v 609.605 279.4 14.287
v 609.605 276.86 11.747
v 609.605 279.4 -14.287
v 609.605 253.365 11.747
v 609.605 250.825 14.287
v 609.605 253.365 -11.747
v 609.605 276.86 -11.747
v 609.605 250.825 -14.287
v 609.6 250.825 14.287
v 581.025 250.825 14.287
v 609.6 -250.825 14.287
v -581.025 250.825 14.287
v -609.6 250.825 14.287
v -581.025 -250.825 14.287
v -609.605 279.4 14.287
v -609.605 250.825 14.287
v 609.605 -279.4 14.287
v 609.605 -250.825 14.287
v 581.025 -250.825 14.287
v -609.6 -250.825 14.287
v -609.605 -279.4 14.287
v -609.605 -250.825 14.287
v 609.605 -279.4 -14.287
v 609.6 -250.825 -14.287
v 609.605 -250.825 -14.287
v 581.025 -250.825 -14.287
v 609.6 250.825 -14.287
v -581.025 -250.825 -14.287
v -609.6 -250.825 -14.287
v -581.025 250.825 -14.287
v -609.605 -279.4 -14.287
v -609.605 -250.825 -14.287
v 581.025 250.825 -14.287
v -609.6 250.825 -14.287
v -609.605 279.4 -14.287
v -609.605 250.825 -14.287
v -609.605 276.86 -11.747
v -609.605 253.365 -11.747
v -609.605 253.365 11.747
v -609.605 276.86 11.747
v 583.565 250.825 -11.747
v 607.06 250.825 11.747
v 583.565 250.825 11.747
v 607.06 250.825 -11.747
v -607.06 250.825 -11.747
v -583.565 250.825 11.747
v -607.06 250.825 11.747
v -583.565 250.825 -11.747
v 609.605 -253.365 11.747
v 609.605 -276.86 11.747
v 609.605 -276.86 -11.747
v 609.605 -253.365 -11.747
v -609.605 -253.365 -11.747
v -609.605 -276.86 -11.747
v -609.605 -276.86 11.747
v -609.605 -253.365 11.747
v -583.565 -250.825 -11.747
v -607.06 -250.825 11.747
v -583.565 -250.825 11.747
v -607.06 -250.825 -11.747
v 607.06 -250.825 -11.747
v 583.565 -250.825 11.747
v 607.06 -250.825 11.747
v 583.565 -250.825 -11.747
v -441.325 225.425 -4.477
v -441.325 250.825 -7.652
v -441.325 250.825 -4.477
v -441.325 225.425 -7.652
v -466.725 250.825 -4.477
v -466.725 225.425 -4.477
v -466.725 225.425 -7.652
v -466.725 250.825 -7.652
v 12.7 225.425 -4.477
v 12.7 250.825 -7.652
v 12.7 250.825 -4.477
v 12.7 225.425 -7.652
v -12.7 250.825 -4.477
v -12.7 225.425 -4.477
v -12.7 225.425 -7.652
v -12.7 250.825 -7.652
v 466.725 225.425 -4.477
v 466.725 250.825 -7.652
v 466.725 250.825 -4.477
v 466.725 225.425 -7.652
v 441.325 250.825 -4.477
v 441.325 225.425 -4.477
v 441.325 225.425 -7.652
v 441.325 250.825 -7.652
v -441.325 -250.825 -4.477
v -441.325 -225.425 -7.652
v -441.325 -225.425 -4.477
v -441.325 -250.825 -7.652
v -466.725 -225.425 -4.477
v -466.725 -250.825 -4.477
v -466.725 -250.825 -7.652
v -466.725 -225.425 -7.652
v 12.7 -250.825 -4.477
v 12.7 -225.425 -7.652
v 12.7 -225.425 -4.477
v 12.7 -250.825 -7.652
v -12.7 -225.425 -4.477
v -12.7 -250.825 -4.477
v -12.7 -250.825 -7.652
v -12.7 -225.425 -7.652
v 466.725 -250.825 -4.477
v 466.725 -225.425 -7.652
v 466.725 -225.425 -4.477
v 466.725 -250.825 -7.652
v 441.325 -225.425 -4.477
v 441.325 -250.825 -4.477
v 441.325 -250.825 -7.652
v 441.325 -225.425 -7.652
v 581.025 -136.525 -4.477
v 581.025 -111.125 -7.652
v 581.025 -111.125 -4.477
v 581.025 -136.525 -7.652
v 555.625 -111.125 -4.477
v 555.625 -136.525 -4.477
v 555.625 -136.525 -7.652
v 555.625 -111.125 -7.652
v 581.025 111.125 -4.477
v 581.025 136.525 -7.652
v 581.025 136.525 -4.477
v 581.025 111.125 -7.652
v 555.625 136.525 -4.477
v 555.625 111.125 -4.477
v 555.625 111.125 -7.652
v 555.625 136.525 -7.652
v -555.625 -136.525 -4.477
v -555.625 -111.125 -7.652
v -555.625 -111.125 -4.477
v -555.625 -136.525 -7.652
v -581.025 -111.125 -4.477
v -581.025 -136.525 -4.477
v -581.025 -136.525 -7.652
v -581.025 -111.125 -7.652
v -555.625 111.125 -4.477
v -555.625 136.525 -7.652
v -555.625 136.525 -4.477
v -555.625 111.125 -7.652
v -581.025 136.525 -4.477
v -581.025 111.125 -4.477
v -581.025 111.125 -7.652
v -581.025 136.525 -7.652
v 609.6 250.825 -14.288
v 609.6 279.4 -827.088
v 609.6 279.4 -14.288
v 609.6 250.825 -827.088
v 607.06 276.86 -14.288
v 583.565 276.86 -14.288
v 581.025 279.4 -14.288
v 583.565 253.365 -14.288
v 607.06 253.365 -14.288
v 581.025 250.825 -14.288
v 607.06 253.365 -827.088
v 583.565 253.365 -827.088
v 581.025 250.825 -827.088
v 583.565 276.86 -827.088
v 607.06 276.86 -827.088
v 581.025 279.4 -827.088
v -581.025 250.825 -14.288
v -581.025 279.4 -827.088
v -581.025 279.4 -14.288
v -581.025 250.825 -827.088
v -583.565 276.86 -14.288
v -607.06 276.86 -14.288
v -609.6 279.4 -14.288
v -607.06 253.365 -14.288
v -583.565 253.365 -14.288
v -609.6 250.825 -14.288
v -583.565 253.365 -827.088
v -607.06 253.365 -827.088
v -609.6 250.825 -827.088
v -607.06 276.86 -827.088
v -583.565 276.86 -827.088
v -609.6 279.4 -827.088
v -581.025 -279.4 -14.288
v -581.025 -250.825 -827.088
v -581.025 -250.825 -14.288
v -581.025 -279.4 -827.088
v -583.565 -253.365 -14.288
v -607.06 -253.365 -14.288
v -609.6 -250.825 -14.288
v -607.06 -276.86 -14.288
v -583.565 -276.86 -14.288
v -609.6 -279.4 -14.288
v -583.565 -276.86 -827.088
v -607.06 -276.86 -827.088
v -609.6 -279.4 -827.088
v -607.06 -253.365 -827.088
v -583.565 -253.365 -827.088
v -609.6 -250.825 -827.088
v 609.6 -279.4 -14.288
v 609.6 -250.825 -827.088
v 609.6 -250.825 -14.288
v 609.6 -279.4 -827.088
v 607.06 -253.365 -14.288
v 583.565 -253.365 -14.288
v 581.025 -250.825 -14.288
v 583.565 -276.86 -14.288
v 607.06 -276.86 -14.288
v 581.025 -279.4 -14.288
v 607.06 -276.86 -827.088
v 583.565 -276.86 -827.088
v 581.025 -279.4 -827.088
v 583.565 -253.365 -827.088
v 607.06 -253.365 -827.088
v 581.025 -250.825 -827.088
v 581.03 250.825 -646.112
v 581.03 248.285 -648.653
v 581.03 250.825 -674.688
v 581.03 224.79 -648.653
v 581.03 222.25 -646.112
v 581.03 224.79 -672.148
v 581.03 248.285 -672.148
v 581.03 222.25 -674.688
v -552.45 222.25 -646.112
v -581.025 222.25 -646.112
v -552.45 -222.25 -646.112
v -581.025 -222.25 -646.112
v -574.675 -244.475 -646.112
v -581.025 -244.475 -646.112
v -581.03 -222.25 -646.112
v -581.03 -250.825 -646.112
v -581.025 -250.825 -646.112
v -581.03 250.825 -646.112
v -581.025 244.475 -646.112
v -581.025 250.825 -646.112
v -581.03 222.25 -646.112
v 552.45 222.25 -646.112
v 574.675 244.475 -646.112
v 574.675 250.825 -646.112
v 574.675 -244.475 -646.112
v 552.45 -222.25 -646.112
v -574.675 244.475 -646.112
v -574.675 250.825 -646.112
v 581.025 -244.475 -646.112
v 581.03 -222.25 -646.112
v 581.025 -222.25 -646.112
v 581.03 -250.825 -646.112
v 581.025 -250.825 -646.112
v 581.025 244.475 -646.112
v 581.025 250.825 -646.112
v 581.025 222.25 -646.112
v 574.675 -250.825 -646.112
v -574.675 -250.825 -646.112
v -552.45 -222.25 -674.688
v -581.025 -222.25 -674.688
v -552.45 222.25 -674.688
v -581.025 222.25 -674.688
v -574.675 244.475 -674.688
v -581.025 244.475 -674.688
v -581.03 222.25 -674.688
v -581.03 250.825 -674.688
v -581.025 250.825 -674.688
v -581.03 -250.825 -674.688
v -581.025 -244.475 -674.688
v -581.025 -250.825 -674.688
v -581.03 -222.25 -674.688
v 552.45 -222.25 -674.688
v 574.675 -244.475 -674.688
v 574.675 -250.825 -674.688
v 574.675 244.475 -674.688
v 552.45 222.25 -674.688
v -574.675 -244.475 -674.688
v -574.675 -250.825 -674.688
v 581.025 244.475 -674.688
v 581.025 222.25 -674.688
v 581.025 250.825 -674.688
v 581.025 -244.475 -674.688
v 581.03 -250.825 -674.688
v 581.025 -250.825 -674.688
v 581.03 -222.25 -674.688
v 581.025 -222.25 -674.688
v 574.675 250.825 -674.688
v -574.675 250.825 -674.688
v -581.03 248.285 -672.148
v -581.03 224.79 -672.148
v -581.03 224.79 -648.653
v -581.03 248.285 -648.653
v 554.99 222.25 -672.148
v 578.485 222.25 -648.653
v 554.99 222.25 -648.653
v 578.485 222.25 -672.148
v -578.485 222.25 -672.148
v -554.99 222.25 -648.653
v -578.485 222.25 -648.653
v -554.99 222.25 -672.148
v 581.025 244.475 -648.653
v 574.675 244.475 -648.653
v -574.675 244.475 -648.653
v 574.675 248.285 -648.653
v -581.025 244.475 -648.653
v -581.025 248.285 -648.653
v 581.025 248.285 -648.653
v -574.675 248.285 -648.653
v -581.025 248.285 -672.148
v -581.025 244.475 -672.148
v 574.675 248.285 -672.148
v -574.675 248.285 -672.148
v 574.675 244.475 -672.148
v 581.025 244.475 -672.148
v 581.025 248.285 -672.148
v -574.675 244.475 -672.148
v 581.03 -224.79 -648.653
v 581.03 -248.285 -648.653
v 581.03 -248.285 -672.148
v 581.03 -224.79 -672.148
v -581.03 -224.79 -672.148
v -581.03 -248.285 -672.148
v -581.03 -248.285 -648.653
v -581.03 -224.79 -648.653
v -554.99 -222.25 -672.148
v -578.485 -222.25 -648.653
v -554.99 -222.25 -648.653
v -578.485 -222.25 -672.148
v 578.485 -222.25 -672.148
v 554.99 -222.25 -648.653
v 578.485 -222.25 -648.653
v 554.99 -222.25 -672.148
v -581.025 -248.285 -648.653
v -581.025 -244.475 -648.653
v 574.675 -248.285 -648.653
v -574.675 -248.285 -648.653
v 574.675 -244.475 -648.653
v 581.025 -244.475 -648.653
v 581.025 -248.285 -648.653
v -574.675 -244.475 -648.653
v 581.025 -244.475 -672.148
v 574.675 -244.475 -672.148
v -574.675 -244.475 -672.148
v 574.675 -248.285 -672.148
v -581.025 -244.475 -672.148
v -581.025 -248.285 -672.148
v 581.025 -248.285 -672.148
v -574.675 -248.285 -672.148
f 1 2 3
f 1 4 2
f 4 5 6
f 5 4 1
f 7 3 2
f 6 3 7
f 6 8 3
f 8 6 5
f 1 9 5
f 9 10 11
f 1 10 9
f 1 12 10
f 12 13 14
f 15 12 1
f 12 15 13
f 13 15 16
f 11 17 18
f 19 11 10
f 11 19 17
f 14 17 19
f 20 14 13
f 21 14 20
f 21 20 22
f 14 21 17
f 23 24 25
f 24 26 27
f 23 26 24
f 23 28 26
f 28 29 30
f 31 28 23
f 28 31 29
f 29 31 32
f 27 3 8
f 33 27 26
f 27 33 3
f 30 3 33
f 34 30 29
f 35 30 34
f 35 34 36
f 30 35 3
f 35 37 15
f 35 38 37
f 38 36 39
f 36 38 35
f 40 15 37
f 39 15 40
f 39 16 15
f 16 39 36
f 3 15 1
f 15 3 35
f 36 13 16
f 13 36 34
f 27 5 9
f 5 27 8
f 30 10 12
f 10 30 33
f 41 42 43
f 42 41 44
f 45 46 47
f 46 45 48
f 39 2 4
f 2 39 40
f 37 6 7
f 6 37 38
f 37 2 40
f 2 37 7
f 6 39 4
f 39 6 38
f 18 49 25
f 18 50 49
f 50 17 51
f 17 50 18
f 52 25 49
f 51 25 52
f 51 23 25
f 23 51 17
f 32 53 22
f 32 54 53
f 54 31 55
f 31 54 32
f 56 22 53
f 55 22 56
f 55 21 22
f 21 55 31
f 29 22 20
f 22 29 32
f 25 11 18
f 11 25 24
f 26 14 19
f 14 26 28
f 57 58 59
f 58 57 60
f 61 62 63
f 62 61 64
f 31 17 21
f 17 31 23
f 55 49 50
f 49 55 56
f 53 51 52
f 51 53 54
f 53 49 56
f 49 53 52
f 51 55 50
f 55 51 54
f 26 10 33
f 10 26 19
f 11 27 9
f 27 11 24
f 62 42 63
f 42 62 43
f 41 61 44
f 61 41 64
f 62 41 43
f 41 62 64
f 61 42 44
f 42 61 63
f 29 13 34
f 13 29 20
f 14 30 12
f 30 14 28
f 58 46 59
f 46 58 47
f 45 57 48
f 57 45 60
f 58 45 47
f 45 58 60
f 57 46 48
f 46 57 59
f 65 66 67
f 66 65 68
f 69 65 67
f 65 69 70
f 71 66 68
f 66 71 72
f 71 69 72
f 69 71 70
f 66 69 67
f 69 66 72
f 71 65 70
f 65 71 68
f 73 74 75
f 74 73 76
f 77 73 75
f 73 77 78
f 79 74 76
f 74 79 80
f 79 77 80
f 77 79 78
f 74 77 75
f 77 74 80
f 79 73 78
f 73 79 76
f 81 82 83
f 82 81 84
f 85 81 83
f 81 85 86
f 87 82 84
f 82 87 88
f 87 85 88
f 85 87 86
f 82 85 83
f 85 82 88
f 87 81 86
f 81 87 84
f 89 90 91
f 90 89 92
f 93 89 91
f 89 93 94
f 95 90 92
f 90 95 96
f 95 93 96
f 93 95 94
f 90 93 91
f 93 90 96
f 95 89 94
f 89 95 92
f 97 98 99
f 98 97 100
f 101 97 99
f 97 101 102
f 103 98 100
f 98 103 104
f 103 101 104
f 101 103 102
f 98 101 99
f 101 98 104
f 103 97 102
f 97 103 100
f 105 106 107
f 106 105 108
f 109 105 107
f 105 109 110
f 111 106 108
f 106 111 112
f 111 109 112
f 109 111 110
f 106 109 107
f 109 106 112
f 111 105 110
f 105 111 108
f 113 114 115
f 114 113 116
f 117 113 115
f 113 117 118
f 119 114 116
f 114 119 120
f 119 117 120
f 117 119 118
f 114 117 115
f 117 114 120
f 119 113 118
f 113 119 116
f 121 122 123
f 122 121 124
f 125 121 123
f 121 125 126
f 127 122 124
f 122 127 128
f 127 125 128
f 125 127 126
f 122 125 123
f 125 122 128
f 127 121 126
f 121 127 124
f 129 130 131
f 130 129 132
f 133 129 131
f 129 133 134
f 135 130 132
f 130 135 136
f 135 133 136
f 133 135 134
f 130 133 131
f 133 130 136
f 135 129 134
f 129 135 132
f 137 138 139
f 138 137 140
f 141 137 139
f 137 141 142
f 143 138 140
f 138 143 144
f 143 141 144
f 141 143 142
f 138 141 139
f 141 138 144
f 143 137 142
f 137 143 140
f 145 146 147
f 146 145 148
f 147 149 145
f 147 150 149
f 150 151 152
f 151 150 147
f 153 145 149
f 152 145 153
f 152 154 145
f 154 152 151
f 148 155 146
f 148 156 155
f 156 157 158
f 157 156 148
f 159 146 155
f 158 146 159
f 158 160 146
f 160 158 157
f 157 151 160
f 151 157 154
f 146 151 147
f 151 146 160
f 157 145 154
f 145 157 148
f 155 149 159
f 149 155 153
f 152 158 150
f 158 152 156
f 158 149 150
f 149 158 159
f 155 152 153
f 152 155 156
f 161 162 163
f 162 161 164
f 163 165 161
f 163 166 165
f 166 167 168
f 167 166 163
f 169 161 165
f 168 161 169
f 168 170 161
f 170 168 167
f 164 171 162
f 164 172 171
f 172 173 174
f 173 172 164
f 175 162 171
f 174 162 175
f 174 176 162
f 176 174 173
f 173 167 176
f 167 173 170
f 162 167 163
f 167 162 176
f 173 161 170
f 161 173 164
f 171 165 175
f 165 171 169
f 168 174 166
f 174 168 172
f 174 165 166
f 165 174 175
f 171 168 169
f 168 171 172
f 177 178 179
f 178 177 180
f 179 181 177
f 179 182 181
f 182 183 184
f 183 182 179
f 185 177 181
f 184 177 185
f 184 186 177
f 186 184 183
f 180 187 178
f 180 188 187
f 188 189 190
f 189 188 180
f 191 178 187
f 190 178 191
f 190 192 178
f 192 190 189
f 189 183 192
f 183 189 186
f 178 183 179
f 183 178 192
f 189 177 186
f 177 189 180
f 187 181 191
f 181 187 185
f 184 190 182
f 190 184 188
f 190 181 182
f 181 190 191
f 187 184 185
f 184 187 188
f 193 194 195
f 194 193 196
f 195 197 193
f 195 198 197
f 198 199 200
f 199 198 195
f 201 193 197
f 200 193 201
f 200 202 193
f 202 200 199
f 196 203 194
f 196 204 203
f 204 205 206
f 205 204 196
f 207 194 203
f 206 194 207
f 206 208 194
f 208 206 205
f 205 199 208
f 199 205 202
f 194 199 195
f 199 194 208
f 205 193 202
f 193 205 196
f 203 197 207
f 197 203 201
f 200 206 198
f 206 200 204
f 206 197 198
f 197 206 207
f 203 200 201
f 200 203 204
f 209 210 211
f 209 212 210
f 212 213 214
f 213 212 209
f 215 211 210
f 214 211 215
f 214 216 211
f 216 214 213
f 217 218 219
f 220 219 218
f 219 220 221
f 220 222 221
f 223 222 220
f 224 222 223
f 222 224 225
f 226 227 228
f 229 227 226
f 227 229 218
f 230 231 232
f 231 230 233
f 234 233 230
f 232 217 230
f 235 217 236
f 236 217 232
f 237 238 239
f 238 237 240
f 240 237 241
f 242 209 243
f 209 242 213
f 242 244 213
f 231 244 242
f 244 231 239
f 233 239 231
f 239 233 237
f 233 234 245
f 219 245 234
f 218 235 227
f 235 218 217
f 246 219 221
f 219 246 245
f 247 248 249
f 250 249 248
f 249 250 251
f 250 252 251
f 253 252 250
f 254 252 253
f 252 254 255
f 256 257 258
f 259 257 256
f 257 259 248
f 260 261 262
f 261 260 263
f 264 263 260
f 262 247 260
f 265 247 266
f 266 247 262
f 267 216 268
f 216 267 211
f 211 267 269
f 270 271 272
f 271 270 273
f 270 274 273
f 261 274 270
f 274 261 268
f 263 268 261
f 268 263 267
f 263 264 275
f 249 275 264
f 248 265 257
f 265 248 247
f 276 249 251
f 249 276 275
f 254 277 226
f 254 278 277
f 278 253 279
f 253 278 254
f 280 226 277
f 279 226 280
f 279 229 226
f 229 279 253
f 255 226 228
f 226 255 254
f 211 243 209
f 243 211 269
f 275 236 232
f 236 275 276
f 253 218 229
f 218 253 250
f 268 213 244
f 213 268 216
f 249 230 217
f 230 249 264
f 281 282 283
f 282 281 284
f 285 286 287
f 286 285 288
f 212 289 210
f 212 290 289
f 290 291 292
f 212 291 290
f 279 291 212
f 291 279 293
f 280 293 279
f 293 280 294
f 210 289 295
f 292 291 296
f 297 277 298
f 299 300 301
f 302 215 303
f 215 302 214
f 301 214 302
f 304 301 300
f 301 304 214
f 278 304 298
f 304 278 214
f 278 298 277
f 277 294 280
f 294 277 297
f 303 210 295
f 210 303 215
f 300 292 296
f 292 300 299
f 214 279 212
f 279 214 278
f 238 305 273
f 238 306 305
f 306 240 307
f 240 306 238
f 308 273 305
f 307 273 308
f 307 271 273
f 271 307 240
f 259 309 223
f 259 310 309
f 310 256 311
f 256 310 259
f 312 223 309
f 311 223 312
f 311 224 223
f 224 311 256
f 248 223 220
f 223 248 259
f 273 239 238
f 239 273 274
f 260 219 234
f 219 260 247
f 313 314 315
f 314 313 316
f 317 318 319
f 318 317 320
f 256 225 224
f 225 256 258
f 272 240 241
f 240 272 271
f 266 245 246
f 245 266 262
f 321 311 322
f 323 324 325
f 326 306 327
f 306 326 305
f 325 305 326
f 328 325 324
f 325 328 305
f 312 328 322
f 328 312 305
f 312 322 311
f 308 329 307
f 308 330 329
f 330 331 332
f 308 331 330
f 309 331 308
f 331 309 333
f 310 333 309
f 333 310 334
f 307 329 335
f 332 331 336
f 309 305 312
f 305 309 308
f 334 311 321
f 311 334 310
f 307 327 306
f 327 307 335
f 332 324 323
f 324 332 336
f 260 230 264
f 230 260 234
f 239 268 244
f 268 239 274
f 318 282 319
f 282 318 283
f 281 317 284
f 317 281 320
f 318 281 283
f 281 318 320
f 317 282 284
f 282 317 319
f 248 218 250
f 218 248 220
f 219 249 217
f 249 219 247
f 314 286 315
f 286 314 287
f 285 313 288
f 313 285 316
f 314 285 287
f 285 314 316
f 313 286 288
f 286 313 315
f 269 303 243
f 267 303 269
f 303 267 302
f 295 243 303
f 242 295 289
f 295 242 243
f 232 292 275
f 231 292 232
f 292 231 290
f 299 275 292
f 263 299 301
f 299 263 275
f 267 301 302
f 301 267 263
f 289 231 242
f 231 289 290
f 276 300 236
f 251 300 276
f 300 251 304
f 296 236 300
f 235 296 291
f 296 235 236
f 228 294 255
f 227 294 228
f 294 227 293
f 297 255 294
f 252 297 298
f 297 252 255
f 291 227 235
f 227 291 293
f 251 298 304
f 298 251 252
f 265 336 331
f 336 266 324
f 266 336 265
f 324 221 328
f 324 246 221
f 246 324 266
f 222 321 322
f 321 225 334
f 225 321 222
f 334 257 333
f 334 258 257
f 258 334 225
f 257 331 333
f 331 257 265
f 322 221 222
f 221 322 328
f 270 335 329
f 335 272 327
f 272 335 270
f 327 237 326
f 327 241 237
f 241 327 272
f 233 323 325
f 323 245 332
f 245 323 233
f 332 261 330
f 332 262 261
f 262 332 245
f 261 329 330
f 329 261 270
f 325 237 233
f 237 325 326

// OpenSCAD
//
// Rectangular/Square Welded Table Frame – Import‑friendly OpenSCAD
// - 1.125" square tube, wall param (0.100" default, set 0.125" for 1/8")
// - Top frame: butt joints
// - Tabs: 3 on long edges, 2 on short edges; 5" from each end; 1"x1"x(tab_thk)
// - Legs: 32" long
// - Stretcher ring: butt-jointed rectangle at height with 0.25"x0.25" corner notches
// - BOM echo with lengths and weight
// Author: M365 Copilot (for Kevin Gordon)
//

unit = 25.4;                      // mm per inch; set to 1 for inch-native display
function U(x) = x * unit;

eps = 0.01;                       // small overlap (mm) for boolean stability
$fa = 2; $fs = 0.5;

// ---------------- Parameters ----------------

// Size (outside dimensions)
outer_x_in = 48;                  // long direction (X) – set equal to Y for a square
outer_y_in = 22;                  // short direction (Y)

// Tube spec
tube_od_in = 1.125;               // square tube OD
wall_in    = 0.100;               // wall thickness (0.100 or 0.125)

// Frame fit
fit_gap_in = 0.00;                // relief on the short frame members (Y) if desired

// Legs
add_legs   = true;
leg_len_in = 32.0;

// Stretcher ring (replaces earlier 4‑rail perimeter)
add_stretcher_ring            = true;
stretcher_bottom_from_floor_in = 6.0;   // bottom of ring above floor
stretcher_notch_in            = 0.25;   // 0.25" x 0.25" corner notch

// Plywood & tabs (support ledges)
add_tabs          = true;
ply_thick_in      = 23/32;              // 0.71875 typical 3/4" plywood
ply_clear_in      = 0.02;               // vertical install clearance
recess_in         = 0.00;               // 0 = flush top; set 0.125 to recess 1/8"

tab_len_in        = 1.00;               // 1" along side
tab_depth_in      = 1.00;               // 1" inward
tab_thk_in        = 0.125;              // default 1/8" tabs (set 0.100 to match 0.100" wall)
tab_edge_margin_in = 5.00;              // centers 5" from each end

// Tab counts (as requested)
n_tabs_long_side  = 3;                  // long edges
n_tabs_short_side = 2;                  // short edges

// Tab holes (optional)
tabs_with_holes   = false;              // set true to add screw holes
hole_dia_in       = 0.188;              // ~3/16"
hole_inset_in     = 0.50;               // hole center inset from wall into tab

// BOM / weight echo (console output)
do_bom_echo             = true;
material_name           = "Steel";       // label only
material_density_lb_in3 = 0.283;         // Steel ~0.283, Aluminum ~0.0975

// ---------------- Derived (model units) ----------------

tube_od  = U(tube_od_in);
wall     = U(wall_in);
fit_gap  = U(fit_gap_in);

outer_x  = U(outer_x_in);
outer_y  = U(outer_y_in);
inner_x  = outer_x - 2 * tube_od;
inner_y  = outer_y - 2 * tube_od;

leg_len  = U(leg_len_in);

stretcher_bottom_from_floor = U(stretcher_bottom_from_floor_in);
stretcher_notch = U(stretcher_notch_in);

ply_thick = U(ply_thick_in);
ply_clear = U(ply_clear_in);
recess    = U(recess_in);

tab_len   = U(tab_len_in);
tab_depth = U(tab_depth_in);
tab_thk   = U(tab_thk_in);
tab_margin = U(tab_edge_margin_in);

hole_dia  = U(hole_dia_in);
hole_inset = U(hole_inset_in);

// ---------------- Geometry Modules ----------------

// Hollow square tube along X
module square_tube_x(L, od=tube_od, w=wall) {
    difference() {
        translate([-L/2, -od/2, -od/2]) cube([L, od, od], center=false);
        // hollow
        translate([-L/2 - eps, -(od/2 - w), -(od/2 - w)])
            cube([L + 2*eps, od - 2*w, od - 2*w], center=false);
    }
}

// Hollow square tube along Z; TOP at z=0; extends downward by L
module square_tube_z(L, od=tube_od, w=wall) {
    difference() {
        translate([-od/2, -od/2, -L]) cube([od, od, L], center=false);
        translate([-(od/2 - w), -(od/2 - w), -L - eps])
            cube([od - 2*w, od - 2*w, L + 2*eps], center=false);
    }
}

// Rectangular butt-jointed frame (two X rails full length, two Y rails between)
module frame_rect(ox=outer_x, oy=outer_y, od=tube_od, w=wall, gap=0) {
    // X rails (full outer_x) at ±Y
    translate([0,  (oy/2 - od/2), 0]) square_tube_x(ox + eps, od, w);
    translate([0, -(oy/2 - od/2), 0]) square_tube_x(ox + eps, od, w);

    // Y rails (length outer_y - 2*od - gap) at ±X
    Ly = oy - 2*od - gap;
    translate([ (ox/2 - od/2), 0, 0]) rotate([0,0,90]) square_tube_x(Ly + eps, od, w);
    translate([-(ox/2 - od/2), 0, 0]) rotate([0,0,90]) square_tube_x(Ly + eps, od, w);
}

// Four legs at outer corners; top of leg flush to frame bottom (z = -od/2)
module legs_four_rect(ox=outer_x, oy=outer_y, od=tube_od, L=leg_len) {
    cx = ox/2 - od/2;
    cy = oy/2 - od/2;
    translate([ +cx, +cy, -od/2 ]) square_tube_z(L, od);
    translate([ -cx, +cy, -od/2 ]) square_tube_z(L, od);
    translate([ -cx, -cy, -od/2 ]) square_tube_z(L, od);
    translate([ +cx, -cy, -od/2 ]) square_tube_z(L, od);
}

// Stretcher ring at height with 0.25"x0.25" corner notches
// Outer size = inner_x × inner_y, so ring OUTER faces align with legs' INNER faces.
module stretcher_ring_notched_rect(ix=inner_x, iy=inner_y, od=tube_od, w=wall,
                                   legL=leg_len, bottom_from_floor=stretcher_bottom_from_floor,
                                   notch=stretcher_notch) {
    // Vertical placement
    z_leg_bottom = -od/2 - legL;
    z_bottom     =  z_leg_bottom + bottom_from_floor;  // bottom of ring tubes
    z_center     =  z_bottom + od/2;                   // square_tube_x is centered in Z

    difference() {
        // Ring itself: butt-jointed frame with outer = (ix, iy)
        translate([0,0,z_center]) frame_rect(ix, iy, od, w, 0);

        // Corner notches (4 cubes). Remove a 0.25"x0.25" bite through tube depth.
        // NE (+X,+Y)
        translate([ +ix/2 - notch, +iy/2 - notch, z_center - od/2 - eps ])
            cube([ notch, notch, od + 2*eps ], center=false);
        // NW (−X,+Y)
        translate([ -ix/2,         +iy/2 - notch, z_center - od/2 - eps ])
            cube([ notch, notch, od + 2*eps ], center=false);
        // SW (−X,−Y)
        translate([ -ix/2,         -iy/2,         z_center - od/2 - eps ])
            cube([ notch, notch, od + 2*eps ], center=false);
        // SE (+X,−Y)
        translate([ +ix/2 - notch, -iy/2,         z_center - od/2 - eps ])
            cube([ notch, notch, od + 2*eps ], center=false);
    }
}

// Tabs: 3 on the long edges, 2 on the short edges; centers at 5" from each end.
// Long axis determined by comparing outer_x vs outer_y.
module tabs_rect_all_sides(ix=inner_x, iy=inner_y, od=tube_od) {
    if (add_tabs) {
        // Vertical placement: tab top meets plywood underside
        z_top =  +od/2 - recess - ply_thick - ply_clear;
        z0    =  z_top - tab_thk;

        // Decide which axis is long (ties → X treated as long)
        longX = (outer_x >= outer_y);
        m = tab_margin;

        // Offsets from center to tab centers on each side
        px = ix/2 - m;   // along X for top/bottom sides
        py = iy/2 - m;   // along Y for left/right sides

        if (longX) {
            // --- Long edges are TOP/BOTTOM (±Y): place 3 tabs each at X = -px, 0, +px ---
            // TOP (+Y): extend −Y
            translate([ -px - tab_len/2, +iy/2 - tab_depth, z0 ]) cube([ tab_len, tab_depth, tab_thk ], center=false);
            translate([  0  - tab_len/2, +iy/2 - tab_depth, z0 ]) cube([ tab_len, tab_depth, tab_thk ], center=false);
            translate([ +px - tab_len/2, +iy/2 - tab_depth, z0 ]) cube([ tab_len, tab_depth, tab_thk ], center=false);
            // BOTTOM (−Y): extend +Y
            translate([ -px - tab_len/2, -iy/2, z0 ]) cube([ tab_len, tab_depth, tab_thk ], center=false);
            translate([  0  - tab_len/2, -iy/2, z0 ]) cube([ tab_len, tab_depth, tab_thk ], center=false);
            translate([ +px - tab_len/2, -iy/2, z0 ]) cube([ tab_len, tab_depth, tab_thk ], center=false);

            // --- Short edges are LEFT/RIGHT (±X): place 2 tabs each at Y = ±py ---
            // RIGHT (+X): extend −X
            translate([ +ix/2 - tab_depth, -py - tab_len/2, z0 ]) cube([ tab_depth, tab_len, tab_thk ], center=false);
            translate([ +ix/2 - tab_depth, +py - tab_len/2, z0 ]) cube([ tab_depth, tab_len, tab_thk ], center=false);
            // LEFT (−X): extend +X
            translate([ -ix/2, -py - tab_len/2, z0 ]) cube([ tab_depth, tab_len, tab_thk ], center=false);
            translate([ -ix/2, +py - tab_len/2, z0 ]) cube([ tab_depth, tab_len, tab_thk ], center=false);
        } else {
            // --- Long edges are LEFT/RIGHT (±X): place 3 tabs each at Y = -py, 0, +py ---
            // RIGHT (+X): extend −X
            translate([ +ix/2 - tab_depth, -py - tab_len/2, z0 ]) cube([ tab_depth, tab_len, tab_thk ], center=false);
            translate([ +ix/2 - tab_depth,  0  - tab_len/2, z0 ]) cube([ tab_depth, tab_len, tab_thk ], center=false);
            translate([ +ix/2 - tab_depth, +py - tab_len/2, z0 ]) cube([ tab_depth, tab_len, tab_thk ], center=false);
            // LEFT (−X): extend +X
            translate([ -ix/2, -py - tab_len/2, z0 ]) cube([ tab_depth, tab_len, tab_thk ], center=false);
            translate([ -ix/2,  0  - tab_len/2, z0 ]) cube([ tab_depth, tab_len, tab_thk ], center=false);
            translate([ -ix/2, +py - tab_len/2, z0 ]) cube([ tab_depth, tab_len, tab_thk ], center=false);

            // --- Short edges are TOP/BOTTOM (±Y): place 2 tabs each at X = ±px ---
            // TOP (+Y): extend −Y
            translate([ -px - tab_len/2, +iy/2 - tab_depth, z0 ]) cube([ tab_len, tab_depth, tab_thk ], center=false);
            translate([ +px - tab_len/2, +iy/2 - tab_depth, z0 ]) cube([ tab_len, tab_depth, tab_thk ], center=false);
            // BOTTOM (−Y): extend +Y
            translate([ -px - tab_len/2, -iy/2, z0 ]) cube([ tab_len, tab_depth, tab_thk ], center=false);
            translate([ +px - tab_len/2, -iy/2, z0 ]) cube([ tab_len, tab_depth, tab_thk ], center=false);
        }
    }
}

// Optional: tab holes matching the 3/2 placement
module tab_holes_rect(ix=inner_x, iy=inner_y, od=tube_od) {
    if (add_tabs && tabs_with_holes) {
        z_top =  +od/2 - recess - ply_thick - ply_clear;
        z0    =  z_top - tab_thk;

        longX = (outer_x >= outer_y);
        m = tab_margin;

        px = ix/2 - m;   // along X (top/bottom)
        py = iy/2 - m;   // along Y (left/right)

        if (longX) {
            // TOP (+Y): 3 holes at X = -px, 0, +px
            translate([ -px, +iy/2 - hole_inset, z0 - eps ]) cylinder(h = tab_thk + 2*eps, d = hole_dia, center=false, $fn=48);
            translate([  0,  +iy/2 - hole_inset, z0 - eps ]) cylinder(h = tab_thk + 2*eps, d = hole_dia, center=false, $fn=48);
            translate([ +px, +iy/2 - hole_inset, z0 - eps ]) cylinder(h = tab_thk + 2*eps, d = hole_dia, center=false, $fn=48);
            // BOTTOM (−Y)
            translate([ -px, -iy/2 + hole_inset, z0 - eps ]) cylinder(h = tab_thk + 2*eps, d = hole_dia, center=false, $fn=48);
            translate([  0,  -iy/2 + hole_inset, z0 - eps ]) cylinder(h = tab_thk + 2*eps, d = hole_dia, center=false, $fn=48);
            translate([ +px, -iy/2 + hole_inset, z0 - eps ]) cylinder(h = tab_thk + 2*eps, d = hole_dia, center=false, $fn=48);

            // RIGHT/LEFT (short edges): 2 holes at Y = ±py
            translate([ +ix/2 - hole_inset, -py, z0 - eps ]) cylinder(h = tab_thk + 2*eps, d = hole_dia, center=false, $fn=48);
            translate([ +ix/2 - hole_inset, +py, z0 - eps ]) cylinder(h = tab_thk + 2*eps, d = hole_dia, center=false, $fn=48);
            translate([ -ix/2 + hole_inset, -py, z0 - eps ]) cylinder(h = tab_thk + 2*eps, d = hole_dia, center=false, $fn=48);
            translate([ -ix/2 + hole_inset, +py, z0 - eps ]) cylinder(h = tab_thk + 2*eps, d = hole_dia, center=false, $fn=48);
        } else {
            // RIGHT/LEFT (long edges): 3 holes at Y = -py, 0, +py
            translate([ +ix/2 - hole_inset, -py, z0 - eps ]) cylinder(h = tab_thk + 2*eps, d = hole_dia, center=false, $fn=48);
            translate([ +ix/2 - hole_inset,  0,  z0 - eps ]) cylinder(h = tab_thk + 2*eps, d = hole_dia, center=false, $fn=48);
            translate([ +ix/2 - hole_inset, +py, z0 - eps ]) cylinder(h = tab_thk + 2*eps, d = hole_dia, center=false, $fn=48);
            translate([ -ix/2 + hole_inset, -py, z0 - eps ]) cylinder(h = tab_thk + 2*eps, d = hole_dia, center=false, $fn=48);
            translate([ -ix/2 + hole_inset,  0,  z0 - eps ]) cylinder(h = tab_thk + 2*eps, d = hole_dia, center=false, $fn=48);
            translate([ -ix/2 + hole_inset, +py, z0 - eps ]) cylinder(h = tab_thk + 2*eps, d = hole_dia, center=false, $fn=48);

            // TOP/BOTTOM (short edges): 2 holes at X = ±px
            translate([ -px, +iy/2 - hole_inset, z0 - eps ]) cylinder(h = tab_thk + 2*eps, d = hole_dia, center=false, $fn=48);
            translate([ +px, +iy/2 - hole_inset, z0 - eps ]) cylinder(h = tab_thk + 2*eps, d = hole_dia, center=false, $fn=48);
            translate([ -px, -iy/2 + hole_inset, z0 - eps ]) cylinder(h = tab_thk + 2*eps, d = hole_dia, center=false, $fn=48);
            translate([ +px, -iy/2 + hole_inset, z0 - eps ]) cylinder(h = tab_thk + 2*eps, d = hole_dia, center=false, $fn=48);
        }
    }
}

// ---------------- Top-level CSG ----------------

render() difference() {
    union() {
        // Top frame
        frame_rect(outer_x, outer_y, tube_od, wall, fit_gap);

        // Tabs
        tabs_rect_all_sides(inner_x, inner_y, tube_od);

        // Legs
        if (add_legs) legs_four_rect(outer_x, outer_y, tube_od, leg_len);

        // Stretcher ring (clean fabrication detail)
        if (add_stretcher_ring)
            stretcher_ring_notched_rect(inner_x, inner_y, tube_od, wall,
                                        leg_len, stretcher_bottom_from_floor,
                                        stretcher_notch);
    }
    // Tab holes (optional)
    tab_holes_rect(inner_x, inner_y, tube_od);
}

// ---------------- Guardrails / Info Echo ----------------

if ((inner_x/2) <= tab_margin || (inner_y/2) <= tab_margin)
    echo("WARNING: tab_edge_margin too large for inner opening; reduce from 5.00 in or enlarge frame.");

// ---------------- BOM / Weight Echo (console) ----------------

if (do_bom_echo) {
    // Clear openings (in)
    inner_x_in = outer_x_in - 2 * tube_od_in;
    inner_y_in = outer_y_in - 2 * tube_od_in;

    // Top frame (butt-jointed)
    frame_long_len_in  = outer_x_in;                        // 2 pcs
    frame_short_len_in = outer_y_in - 2 * tube_od_in - fit_gap_in;  // 2 pcs

    // Stretcher ring (outer = inner opening)
    ring_long_len_in  = inner_x_in;                         // 2 pcs
    ring_short_len_in = inner_y_in - 2 * tube_od_in;        // 2 pcs

    // Legs
    leg_len_each_in = leg_len_in;                           // 4 pcs

    // Tabs: 3 per long side, 2 per short side (two sides each)
    longX_flag = (outer_x_in >= outer_y_in);
    tabs_on_long_side  = n_tabs_long_side;
    tabs_on_short_side = n_tabs_short_side;
    q_tabs = 2 * (longX_flag ? tabs_on_long_side : tabs_on_short_side)
           + 2 * (longX_flag ? tabs_on_short_side : tabs_on_long_side);

    // Quantities
    q_frame_long  = 2;
    q_frame_short = 2;
    q_ring_long   = 2;
    q_ring_short  = 2;
    q_leg         = 4;

    // Cross-section area (in^2) for hollow square tube
    inner_side_in = tube_od_in - 2*wall_in;
    xsec_area_in2 = tube_od_in*tube_od_in - inner_side_in*inner_side_in;

    // Total tube length (in)
    total_len_in = q_frame_long*frame_long_len_in +
                   q_frame_short*frame_short_len_in +
                   q_ring_long*ring_long_len_in +
                   q_ring_short*ring_short_len_in +
                   q_leg*leg_len_each_in;

    // Tube weight (lb)
    tube_weight_lb = xsec_area_in2 * total_len_in * material_density_lb_in3;

    // Tabs weight (lb)
    tab_vol_in3 = 1.0 * 1.0 * tab_thk_in;   // each 1" x 1" x tab_thk
    tabs_weight_lb = q_tabs * tab_vol_in3 * material_density_lb_in3;

    total_weight_lb = tube_weight_lb + tabs_weight_lb;

    // Echo in CSV-like lines
    echo(str("BOM, material=", material_name, ", density_lb_in3=", material_density_lb_in3));
    echo(str("BOM, frame_long, qty=", q_frame_long, ", len_in=", frame_long_len_in, ", stock=1.125x", wall_in, " sq tube"));
    echo(str("BOM, frame_short, qty=", q_frame_short, ", len_in=", frame_short_len_in, ", stock=1.125x", wall_in, " sq tube"));
    echo(str("BOM, ring_long, qty=", q_ring_long, ", len_in=", ring_long_len_in, ", stock=1.125x", wall_in, " sq tube"));
    echo(str("BOM, ring_short, qty=", q_ring_short, ", len_in=", ring_short_len_in, ", stock=1.125x", wall_in, " sq tube"));
    echo(str("BOM, leg, qty=", q_leg, ", len_in=", leg_len_each_in, ", stock=1.125x", wall_in, " sq tube"));
    echo(str("BOM, tabs, qty=", q_tabs, ", size_in=1x1x", tab_thk_in));

    echo(str("BOM_TOTAL, tube_len_in=", total_len_in, ", tube_len_ft=", total_len_in/12.0));
    echo(str("BOM_TOTAL, tube_weight_lb=", tube_weight_lb, ", tabs_weight_lb=", tabs_weight_lb, ", total_weight_lb=", total_weight_lb));

    // Sanity info
    echo(str("INFO, inner_opening_x_in=", inner_x_in, ", inner_opening_y_in=", inner_y_in));
    echo(str("INFO, long_axis=", longX_flag ? "X" : "Y", ", tabs_long_side=", n_tabs_long_side, ", tabs_short_side=", n_tabs_short_side));
}
